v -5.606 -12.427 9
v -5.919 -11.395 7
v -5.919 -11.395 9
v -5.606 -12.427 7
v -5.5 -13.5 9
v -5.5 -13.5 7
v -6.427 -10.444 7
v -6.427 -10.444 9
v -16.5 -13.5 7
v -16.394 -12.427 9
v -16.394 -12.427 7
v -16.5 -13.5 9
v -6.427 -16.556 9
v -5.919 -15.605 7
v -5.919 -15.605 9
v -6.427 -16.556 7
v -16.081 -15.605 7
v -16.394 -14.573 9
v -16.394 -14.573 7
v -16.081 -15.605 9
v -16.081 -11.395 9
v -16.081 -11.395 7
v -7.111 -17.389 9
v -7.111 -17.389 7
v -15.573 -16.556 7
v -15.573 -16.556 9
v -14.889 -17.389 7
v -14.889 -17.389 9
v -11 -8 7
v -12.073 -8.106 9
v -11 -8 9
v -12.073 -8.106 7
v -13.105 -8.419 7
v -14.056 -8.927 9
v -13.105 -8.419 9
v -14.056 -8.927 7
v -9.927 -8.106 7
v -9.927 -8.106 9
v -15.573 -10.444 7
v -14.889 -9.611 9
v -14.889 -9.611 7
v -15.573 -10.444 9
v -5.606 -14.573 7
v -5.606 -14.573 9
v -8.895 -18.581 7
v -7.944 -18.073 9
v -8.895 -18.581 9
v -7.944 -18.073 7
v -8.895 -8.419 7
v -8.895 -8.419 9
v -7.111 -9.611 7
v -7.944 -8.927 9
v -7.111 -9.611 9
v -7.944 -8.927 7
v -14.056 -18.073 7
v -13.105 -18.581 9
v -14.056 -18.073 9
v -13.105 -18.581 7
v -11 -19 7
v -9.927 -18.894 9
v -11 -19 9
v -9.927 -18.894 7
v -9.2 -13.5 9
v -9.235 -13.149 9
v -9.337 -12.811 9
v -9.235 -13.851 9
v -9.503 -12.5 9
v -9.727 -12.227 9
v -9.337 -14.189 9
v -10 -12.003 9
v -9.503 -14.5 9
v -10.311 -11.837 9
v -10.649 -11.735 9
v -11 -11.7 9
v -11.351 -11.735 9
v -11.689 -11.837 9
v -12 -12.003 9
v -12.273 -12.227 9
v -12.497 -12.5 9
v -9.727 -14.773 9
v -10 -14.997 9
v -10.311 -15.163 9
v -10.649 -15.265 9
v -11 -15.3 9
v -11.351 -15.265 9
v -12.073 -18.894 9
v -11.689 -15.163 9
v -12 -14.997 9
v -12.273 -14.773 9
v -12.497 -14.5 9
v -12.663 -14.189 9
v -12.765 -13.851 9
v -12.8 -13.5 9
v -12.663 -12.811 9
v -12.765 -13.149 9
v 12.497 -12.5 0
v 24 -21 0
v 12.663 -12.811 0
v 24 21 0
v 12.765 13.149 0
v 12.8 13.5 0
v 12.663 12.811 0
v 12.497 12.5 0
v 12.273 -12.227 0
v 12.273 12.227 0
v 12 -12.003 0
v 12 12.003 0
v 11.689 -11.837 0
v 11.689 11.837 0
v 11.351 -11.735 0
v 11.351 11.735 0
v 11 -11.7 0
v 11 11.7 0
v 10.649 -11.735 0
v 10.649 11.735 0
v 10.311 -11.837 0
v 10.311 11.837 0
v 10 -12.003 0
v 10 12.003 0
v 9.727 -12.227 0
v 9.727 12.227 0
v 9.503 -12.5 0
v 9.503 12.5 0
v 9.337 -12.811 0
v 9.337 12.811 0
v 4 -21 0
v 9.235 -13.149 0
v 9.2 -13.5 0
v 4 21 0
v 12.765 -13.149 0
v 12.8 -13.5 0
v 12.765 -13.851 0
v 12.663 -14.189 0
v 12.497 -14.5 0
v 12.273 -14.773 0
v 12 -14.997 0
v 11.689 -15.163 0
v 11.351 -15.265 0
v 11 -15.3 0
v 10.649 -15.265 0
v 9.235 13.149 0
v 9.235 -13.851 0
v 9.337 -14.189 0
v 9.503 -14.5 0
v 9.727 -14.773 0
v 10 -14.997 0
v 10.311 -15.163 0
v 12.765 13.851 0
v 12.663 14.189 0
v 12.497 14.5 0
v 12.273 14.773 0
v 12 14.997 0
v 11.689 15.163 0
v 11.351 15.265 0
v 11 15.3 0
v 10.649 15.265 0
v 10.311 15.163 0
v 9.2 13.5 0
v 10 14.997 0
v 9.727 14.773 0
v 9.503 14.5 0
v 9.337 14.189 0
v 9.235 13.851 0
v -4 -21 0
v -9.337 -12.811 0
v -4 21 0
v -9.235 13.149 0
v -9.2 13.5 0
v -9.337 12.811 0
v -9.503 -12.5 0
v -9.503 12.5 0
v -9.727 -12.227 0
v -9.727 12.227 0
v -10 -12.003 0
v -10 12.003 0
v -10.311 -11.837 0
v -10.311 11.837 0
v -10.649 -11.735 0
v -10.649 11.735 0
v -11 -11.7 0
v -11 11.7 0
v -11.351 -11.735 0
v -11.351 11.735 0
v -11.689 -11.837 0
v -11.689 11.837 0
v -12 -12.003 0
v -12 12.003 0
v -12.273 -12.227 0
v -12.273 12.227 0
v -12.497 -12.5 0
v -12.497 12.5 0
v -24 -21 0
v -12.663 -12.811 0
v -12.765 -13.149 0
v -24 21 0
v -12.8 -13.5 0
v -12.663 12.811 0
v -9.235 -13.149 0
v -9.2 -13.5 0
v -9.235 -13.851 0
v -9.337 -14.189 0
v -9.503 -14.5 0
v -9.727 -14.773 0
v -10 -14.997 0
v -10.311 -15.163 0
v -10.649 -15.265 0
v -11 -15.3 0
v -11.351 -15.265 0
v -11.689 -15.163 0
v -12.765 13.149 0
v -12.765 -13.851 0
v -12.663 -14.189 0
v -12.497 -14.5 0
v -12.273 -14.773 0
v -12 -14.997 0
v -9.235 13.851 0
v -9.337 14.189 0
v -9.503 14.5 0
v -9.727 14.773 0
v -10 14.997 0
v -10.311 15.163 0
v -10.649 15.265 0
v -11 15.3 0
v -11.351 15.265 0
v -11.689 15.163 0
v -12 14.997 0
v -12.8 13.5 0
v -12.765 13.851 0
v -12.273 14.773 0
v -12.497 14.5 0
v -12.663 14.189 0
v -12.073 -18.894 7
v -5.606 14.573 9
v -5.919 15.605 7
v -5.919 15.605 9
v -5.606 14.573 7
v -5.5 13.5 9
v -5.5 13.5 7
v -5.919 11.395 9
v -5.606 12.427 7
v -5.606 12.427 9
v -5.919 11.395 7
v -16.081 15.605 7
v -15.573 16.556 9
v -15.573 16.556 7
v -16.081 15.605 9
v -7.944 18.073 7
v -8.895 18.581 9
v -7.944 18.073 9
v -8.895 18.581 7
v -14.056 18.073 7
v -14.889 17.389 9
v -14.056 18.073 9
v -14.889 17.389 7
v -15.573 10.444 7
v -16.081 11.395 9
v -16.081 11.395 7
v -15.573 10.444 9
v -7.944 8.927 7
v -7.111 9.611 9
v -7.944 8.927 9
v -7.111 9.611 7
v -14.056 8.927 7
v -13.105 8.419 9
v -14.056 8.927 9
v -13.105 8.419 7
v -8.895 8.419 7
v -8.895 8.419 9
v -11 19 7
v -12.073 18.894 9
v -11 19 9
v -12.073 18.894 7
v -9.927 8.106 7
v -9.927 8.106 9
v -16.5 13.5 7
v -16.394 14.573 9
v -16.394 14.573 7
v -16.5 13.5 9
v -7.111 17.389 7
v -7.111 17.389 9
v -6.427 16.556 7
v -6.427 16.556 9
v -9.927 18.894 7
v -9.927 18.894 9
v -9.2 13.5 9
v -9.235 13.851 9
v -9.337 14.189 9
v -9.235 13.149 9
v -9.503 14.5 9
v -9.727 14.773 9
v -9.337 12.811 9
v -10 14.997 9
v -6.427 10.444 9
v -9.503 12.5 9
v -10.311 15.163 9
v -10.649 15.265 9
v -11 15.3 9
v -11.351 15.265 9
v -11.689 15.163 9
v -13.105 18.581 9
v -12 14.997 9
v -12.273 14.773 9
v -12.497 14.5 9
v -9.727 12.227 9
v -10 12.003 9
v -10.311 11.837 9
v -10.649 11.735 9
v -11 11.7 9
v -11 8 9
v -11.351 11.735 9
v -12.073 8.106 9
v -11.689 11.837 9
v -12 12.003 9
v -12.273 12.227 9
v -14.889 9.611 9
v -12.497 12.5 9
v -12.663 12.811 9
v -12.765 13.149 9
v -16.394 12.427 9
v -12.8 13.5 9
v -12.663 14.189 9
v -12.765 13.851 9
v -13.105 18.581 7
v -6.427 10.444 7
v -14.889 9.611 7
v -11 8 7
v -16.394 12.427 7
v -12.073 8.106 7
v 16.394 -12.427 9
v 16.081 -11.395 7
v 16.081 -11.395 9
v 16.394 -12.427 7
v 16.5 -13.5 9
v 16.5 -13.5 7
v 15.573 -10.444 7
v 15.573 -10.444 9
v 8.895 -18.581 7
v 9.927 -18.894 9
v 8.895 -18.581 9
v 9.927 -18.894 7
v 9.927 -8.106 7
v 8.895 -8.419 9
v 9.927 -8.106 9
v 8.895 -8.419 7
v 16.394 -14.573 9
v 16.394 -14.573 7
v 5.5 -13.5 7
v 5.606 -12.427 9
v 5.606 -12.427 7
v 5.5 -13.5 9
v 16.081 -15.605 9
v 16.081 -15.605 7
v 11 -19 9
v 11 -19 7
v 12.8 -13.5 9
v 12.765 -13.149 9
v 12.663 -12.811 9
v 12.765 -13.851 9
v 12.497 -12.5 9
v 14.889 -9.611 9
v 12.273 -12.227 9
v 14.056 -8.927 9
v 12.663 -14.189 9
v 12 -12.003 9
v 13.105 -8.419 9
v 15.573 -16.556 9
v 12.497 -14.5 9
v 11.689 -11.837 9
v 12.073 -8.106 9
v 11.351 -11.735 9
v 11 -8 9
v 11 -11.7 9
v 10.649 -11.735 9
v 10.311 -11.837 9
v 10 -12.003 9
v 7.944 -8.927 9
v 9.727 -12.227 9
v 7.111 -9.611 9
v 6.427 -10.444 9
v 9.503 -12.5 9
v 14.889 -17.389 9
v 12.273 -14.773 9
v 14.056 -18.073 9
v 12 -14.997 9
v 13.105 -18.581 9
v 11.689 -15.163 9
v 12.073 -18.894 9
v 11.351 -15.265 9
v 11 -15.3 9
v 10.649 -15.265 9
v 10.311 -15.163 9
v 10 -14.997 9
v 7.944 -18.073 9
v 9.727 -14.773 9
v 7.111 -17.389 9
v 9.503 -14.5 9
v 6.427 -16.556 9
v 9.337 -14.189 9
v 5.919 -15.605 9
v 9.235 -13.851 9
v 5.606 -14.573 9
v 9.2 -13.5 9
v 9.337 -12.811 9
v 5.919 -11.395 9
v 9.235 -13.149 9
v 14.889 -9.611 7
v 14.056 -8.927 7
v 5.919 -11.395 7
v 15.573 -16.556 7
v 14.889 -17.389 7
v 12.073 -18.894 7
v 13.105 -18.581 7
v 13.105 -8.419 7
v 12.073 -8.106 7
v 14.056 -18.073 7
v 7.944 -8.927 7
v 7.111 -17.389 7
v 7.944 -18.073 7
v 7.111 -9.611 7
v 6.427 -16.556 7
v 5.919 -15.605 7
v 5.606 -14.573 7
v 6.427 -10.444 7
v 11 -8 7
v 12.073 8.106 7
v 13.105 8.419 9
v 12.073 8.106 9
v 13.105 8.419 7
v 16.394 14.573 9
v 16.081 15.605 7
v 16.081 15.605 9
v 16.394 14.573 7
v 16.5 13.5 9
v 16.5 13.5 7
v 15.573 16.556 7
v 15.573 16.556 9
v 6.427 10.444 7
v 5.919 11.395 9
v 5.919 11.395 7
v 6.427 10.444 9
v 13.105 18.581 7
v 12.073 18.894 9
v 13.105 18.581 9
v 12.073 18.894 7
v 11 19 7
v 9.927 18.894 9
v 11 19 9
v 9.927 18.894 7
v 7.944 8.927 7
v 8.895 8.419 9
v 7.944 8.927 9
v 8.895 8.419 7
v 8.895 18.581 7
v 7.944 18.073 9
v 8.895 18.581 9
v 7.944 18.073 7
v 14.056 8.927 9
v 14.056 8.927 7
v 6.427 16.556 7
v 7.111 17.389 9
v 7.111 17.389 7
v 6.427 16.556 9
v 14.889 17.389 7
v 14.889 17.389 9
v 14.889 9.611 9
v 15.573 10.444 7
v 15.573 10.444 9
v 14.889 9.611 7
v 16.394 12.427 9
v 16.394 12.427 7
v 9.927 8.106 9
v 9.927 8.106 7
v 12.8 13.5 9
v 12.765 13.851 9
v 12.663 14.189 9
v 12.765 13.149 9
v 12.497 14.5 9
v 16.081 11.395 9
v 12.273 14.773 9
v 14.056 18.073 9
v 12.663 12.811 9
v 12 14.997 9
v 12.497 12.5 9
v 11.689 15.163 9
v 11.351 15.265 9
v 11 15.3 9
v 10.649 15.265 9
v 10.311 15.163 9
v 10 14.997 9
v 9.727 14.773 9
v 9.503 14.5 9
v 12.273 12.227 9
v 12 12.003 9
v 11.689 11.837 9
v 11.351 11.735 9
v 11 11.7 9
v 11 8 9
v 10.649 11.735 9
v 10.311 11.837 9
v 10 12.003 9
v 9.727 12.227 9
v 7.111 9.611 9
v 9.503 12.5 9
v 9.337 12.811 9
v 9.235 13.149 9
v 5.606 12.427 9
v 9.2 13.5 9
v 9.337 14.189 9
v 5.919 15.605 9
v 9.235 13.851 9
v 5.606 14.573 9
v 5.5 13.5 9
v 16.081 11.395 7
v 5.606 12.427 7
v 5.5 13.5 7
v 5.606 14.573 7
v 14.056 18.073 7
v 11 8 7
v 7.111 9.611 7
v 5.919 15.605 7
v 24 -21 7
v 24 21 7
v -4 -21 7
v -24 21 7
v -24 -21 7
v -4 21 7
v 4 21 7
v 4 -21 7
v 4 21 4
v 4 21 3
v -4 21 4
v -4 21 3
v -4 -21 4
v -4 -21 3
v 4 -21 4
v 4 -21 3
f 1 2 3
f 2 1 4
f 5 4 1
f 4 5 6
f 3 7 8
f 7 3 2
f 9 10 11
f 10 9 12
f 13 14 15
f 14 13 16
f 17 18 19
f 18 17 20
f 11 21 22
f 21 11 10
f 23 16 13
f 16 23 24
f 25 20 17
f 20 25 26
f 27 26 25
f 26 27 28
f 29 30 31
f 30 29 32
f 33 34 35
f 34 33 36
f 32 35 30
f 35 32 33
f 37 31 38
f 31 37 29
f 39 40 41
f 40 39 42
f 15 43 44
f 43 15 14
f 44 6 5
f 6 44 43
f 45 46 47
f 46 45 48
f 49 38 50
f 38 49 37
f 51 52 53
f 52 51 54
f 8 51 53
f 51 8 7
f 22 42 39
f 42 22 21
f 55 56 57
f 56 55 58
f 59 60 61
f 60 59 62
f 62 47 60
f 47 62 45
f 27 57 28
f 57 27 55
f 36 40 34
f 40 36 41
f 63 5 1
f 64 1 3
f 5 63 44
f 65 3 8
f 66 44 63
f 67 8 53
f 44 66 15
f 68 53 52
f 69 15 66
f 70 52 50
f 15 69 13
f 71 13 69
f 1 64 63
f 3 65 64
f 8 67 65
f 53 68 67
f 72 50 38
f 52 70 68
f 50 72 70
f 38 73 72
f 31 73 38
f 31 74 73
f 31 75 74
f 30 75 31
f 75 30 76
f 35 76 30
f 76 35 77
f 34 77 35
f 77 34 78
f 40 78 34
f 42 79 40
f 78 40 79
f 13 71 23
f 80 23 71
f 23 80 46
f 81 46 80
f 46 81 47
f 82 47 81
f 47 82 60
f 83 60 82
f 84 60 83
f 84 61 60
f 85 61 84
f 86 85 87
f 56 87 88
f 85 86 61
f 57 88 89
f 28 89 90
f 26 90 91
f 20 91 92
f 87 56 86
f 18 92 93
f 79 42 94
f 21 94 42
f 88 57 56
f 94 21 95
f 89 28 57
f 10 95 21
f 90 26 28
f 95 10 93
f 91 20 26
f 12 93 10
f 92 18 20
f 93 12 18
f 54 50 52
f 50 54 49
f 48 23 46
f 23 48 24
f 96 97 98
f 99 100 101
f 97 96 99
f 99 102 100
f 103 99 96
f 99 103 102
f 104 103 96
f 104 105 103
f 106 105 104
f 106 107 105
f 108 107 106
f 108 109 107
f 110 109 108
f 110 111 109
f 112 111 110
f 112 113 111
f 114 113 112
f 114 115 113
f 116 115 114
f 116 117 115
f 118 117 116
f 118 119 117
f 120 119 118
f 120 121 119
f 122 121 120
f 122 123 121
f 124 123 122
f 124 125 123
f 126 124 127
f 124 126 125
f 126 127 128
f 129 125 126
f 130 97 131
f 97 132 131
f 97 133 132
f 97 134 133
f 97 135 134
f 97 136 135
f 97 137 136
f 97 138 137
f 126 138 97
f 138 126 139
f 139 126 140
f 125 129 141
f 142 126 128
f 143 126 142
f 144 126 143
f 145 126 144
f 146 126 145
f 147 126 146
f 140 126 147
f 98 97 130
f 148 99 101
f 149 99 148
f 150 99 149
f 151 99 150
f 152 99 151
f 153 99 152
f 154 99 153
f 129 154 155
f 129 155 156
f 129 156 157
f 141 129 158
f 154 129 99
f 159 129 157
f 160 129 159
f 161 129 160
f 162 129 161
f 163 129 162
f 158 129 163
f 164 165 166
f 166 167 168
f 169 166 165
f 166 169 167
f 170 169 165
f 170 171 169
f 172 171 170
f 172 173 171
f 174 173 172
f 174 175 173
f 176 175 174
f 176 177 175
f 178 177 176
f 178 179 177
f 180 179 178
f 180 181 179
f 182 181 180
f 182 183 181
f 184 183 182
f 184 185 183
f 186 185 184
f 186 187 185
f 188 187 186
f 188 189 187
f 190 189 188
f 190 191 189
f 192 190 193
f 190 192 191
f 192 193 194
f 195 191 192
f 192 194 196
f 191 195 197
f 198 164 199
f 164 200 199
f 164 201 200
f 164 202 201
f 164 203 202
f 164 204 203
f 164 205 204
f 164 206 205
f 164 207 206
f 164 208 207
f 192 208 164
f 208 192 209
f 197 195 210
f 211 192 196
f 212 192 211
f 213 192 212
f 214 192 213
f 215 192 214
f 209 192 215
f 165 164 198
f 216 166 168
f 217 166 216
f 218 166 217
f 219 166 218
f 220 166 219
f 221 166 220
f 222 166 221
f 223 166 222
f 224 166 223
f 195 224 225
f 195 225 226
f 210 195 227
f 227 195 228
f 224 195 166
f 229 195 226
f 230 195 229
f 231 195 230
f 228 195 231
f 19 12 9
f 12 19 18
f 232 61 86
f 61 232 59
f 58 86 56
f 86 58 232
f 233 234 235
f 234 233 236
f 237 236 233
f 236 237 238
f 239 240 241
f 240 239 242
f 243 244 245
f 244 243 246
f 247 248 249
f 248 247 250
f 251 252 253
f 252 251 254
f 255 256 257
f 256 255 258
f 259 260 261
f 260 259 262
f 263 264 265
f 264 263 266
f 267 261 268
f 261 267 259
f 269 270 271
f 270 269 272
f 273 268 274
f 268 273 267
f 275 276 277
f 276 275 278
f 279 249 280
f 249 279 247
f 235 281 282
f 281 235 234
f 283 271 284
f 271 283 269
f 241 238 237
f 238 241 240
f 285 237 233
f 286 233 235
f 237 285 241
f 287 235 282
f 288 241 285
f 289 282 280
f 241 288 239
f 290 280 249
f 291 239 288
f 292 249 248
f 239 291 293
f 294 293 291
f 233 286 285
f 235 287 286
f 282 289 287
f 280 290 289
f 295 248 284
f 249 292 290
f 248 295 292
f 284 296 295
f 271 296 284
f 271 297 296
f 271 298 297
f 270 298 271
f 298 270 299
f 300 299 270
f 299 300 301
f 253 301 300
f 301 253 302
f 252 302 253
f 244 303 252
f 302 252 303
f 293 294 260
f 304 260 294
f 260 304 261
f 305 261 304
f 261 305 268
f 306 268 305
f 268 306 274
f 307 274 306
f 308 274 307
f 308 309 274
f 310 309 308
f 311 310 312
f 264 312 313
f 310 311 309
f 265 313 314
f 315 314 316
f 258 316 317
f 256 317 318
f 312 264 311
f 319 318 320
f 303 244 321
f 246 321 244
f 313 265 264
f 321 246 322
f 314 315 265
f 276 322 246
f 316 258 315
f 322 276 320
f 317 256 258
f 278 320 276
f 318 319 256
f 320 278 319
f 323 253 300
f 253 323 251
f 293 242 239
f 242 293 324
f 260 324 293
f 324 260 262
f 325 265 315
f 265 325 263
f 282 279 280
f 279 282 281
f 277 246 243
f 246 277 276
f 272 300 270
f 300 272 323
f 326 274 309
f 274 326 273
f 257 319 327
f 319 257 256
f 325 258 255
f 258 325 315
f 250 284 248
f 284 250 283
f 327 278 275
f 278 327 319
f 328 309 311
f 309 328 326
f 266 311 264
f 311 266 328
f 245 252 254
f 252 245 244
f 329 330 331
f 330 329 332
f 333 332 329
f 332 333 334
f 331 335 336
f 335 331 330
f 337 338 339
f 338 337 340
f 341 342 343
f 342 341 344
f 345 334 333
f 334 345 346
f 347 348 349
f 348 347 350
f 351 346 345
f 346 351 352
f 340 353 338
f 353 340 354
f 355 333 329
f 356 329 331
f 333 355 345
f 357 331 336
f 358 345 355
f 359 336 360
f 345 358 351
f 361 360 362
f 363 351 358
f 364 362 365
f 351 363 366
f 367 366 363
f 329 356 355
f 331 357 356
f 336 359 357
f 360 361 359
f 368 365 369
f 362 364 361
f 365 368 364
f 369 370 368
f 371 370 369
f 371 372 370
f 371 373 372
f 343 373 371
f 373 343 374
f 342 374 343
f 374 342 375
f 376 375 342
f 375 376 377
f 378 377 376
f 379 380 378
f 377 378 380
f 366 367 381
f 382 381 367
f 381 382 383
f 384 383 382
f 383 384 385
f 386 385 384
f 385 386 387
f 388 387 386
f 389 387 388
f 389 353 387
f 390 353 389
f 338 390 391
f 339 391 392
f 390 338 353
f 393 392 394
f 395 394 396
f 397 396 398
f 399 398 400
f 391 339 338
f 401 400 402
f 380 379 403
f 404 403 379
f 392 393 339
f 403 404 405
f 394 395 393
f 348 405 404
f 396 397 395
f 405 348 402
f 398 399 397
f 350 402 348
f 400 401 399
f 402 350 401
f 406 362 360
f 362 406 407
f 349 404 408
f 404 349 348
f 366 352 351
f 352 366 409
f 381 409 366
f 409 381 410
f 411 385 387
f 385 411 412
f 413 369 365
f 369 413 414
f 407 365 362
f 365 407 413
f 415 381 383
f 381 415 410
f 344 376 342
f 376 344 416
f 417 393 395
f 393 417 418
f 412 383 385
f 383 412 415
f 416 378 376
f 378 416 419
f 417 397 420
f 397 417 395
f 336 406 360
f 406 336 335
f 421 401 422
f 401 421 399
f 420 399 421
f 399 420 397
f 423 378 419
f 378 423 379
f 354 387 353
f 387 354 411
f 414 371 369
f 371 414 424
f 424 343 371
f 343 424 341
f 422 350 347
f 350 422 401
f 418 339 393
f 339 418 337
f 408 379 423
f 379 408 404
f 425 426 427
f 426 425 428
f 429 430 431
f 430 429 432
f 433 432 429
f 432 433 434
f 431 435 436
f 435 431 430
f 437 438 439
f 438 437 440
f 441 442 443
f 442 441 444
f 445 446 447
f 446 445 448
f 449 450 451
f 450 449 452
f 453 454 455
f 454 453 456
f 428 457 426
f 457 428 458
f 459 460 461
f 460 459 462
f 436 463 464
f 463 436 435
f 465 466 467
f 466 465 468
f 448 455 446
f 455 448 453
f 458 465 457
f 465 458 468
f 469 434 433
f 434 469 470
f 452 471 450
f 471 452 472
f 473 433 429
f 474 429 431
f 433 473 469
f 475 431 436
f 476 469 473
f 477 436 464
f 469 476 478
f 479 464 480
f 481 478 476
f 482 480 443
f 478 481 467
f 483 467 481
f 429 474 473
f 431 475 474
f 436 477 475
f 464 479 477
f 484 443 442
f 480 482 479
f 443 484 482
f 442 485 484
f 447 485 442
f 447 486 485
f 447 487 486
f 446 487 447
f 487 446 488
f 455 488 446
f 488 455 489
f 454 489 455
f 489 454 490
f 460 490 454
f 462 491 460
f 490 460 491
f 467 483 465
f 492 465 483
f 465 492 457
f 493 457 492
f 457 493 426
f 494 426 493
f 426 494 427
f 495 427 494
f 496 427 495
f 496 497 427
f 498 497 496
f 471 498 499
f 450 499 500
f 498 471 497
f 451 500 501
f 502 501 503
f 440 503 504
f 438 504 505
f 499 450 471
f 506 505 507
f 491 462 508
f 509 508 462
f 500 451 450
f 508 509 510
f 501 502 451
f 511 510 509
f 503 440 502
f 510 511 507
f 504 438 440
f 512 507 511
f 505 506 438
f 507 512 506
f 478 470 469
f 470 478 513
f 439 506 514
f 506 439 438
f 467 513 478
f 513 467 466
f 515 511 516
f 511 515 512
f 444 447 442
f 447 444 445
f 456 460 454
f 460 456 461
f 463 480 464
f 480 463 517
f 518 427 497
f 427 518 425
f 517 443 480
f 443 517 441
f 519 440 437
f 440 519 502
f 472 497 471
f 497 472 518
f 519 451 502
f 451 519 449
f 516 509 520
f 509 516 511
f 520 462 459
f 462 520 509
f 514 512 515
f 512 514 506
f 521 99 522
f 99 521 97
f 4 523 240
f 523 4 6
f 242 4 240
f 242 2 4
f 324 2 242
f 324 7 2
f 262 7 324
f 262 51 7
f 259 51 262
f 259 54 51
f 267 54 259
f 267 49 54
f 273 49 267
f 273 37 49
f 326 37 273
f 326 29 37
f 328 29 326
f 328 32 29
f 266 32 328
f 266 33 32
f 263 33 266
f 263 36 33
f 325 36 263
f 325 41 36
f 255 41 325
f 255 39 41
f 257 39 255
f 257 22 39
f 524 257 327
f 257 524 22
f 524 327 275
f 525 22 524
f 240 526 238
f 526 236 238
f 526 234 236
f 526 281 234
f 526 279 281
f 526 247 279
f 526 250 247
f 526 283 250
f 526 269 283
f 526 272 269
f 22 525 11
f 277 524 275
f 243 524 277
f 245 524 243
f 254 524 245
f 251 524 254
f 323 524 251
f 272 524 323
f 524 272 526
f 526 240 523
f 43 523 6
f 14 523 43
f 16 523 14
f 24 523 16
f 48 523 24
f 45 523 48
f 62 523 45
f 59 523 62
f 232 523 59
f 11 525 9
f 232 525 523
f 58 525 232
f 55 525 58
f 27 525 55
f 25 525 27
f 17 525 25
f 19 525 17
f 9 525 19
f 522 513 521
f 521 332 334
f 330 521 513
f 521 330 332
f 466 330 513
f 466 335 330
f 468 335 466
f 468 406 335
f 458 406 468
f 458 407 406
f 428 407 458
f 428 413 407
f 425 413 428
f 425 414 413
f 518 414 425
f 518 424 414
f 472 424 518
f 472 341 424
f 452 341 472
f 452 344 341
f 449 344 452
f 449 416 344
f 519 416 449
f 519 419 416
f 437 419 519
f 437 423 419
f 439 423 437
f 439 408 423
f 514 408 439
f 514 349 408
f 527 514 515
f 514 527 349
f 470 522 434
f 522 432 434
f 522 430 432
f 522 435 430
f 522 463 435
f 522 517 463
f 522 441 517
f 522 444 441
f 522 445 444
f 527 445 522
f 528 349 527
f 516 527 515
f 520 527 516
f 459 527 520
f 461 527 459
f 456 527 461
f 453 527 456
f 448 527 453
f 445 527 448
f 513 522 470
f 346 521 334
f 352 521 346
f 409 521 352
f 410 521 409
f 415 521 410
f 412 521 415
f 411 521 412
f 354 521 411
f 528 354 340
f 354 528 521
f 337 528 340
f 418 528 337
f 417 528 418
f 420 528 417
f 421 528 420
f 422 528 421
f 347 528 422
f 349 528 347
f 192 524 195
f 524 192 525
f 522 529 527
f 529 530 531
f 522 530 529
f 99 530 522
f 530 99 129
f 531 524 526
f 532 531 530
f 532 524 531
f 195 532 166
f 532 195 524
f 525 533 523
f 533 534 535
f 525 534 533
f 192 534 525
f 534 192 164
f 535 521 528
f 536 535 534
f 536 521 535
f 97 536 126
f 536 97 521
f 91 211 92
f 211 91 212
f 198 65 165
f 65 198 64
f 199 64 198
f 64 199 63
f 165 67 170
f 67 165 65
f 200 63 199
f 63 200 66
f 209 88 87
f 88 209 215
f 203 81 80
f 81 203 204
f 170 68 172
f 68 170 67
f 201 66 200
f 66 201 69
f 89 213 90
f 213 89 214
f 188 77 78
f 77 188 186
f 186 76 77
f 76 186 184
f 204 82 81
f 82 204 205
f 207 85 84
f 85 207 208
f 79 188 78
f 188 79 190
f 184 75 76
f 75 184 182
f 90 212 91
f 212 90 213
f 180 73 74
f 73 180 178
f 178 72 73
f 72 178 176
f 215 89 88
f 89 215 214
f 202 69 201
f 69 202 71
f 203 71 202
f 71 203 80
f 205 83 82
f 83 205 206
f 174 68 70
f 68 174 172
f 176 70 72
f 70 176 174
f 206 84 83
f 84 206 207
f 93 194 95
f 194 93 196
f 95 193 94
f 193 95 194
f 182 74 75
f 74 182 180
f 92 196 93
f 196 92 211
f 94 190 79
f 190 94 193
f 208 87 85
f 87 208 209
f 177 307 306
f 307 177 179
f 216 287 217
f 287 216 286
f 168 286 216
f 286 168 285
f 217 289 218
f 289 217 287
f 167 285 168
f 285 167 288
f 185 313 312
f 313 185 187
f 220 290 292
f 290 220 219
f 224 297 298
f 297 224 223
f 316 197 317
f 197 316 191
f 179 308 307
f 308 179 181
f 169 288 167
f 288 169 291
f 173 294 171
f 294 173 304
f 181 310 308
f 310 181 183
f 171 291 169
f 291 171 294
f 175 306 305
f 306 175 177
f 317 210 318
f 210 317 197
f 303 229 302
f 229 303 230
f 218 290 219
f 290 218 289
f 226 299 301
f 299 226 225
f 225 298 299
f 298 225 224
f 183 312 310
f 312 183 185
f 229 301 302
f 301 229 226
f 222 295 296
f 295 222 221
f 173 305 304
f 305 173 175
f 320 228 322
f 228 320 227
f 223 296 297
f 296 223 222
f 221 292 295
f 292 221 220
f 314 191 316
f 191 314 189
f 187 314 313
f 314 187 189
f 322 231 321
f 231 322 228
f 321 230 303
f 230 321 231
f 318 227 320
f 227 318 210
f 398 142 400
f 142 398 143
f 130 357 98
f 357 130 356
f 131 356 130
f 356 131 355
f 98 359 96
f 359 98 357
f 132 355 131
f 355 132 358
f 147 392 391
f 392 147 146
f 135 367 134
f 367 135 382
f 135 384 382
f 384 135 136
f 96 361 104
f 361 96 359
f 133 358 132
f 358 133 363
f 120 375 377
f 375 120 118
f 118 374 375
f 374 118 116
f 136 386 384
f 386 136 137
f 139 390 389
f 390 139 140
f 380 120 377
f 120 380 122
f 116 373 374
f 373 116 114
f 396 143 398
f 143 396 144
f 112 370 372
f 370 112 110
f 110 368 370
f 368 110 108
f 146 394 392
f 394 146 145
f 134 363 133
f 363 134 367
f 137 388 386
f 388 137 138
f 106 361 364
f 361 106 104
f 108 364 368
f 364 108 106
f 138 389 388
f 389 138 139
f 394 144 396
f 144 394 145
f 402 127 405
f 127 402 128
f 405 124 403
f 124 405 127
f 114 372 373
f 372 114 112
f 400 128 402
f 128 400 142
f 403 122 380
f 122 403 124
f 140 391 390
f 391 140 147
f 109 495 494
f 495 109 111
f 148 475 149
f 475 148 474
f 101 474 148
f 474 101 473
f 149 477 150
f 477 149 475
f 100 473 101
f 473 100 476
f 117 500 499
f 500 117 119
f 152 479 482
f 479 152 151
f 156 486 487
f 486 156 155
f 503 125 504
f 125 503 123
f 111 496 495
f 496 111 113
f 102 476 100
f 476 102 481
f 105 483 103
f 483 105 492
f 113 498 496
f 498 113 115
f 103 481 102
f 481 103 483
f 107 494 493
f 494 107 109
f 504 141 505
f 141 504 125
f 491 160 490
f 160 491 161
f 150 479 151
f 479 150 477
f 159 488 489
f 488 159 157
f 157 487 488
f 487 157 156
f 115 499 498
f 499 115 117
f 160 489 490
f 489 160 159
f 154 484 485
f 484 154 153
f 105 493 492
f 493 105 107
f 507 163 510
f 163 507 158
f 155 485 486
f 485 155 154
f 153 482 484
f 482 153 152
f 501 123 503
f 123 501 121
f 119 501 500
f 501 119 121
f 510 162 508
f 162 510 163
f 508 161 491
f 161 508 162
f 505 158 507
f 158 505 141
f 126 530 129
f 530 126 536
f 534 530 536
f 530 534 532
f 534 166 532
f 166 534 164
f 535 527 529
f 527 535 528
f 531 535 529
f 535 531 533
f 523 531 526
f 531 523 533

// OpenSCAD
$fn = 32;

// ----------------------------------------------------------------------
// Living hinge: 48 x 42 mm plates, 1 mm flexible web
// ----------------------------------------------------------------------

// --- parameters (mm) ---
plate_len = 20;           // plate length outside the web
plate_w = 42;             // plate width
thick = 7;                // plate thickness
web_half = 4;             // half width of the flex band
web_t = 1;                // flexible web thickness
web_z = 3;                // web position inside the thickness
boss_d = 11;              // screw boss diameter
boss_h = 9;               // screw boss height
boss_x = 11;              // screw boss distance from the web
screw_d = 3.6;            // screw hole

difference() {
  union() {
    /* one flat strip, later thinned at the middle */
    translate([-24, -21, 0]) cube([48, 42, 7]);
    /* screw bosses, sunk 0.5 mm into the plates */
    for (sx = [-11, 11]) {
      for (sy = [-13.5, 13.5]) {
        translate([sx, sy, 0]) cylinder(h = boss_h, d = boss_d);
      }
    }
  }
  /* channel from below: leaves the web on top of it */
  translate([-4, -23.5, -2.5]) cube([8, 47, 5.5]);
  /* channel from above: thins the web down to web_t */
  translate([-4, -23.5, 4]) cube([8, 47, 5.5]);
  /* screw holes through the bosses */
  for (sx = [-11, 11]) {
    for (sy = [-13.5, 13.5]) {
      translate([sx, sy, -2.5]) cylinder(h = boss_h + 5, d = screw_d);
    }
  }
}
